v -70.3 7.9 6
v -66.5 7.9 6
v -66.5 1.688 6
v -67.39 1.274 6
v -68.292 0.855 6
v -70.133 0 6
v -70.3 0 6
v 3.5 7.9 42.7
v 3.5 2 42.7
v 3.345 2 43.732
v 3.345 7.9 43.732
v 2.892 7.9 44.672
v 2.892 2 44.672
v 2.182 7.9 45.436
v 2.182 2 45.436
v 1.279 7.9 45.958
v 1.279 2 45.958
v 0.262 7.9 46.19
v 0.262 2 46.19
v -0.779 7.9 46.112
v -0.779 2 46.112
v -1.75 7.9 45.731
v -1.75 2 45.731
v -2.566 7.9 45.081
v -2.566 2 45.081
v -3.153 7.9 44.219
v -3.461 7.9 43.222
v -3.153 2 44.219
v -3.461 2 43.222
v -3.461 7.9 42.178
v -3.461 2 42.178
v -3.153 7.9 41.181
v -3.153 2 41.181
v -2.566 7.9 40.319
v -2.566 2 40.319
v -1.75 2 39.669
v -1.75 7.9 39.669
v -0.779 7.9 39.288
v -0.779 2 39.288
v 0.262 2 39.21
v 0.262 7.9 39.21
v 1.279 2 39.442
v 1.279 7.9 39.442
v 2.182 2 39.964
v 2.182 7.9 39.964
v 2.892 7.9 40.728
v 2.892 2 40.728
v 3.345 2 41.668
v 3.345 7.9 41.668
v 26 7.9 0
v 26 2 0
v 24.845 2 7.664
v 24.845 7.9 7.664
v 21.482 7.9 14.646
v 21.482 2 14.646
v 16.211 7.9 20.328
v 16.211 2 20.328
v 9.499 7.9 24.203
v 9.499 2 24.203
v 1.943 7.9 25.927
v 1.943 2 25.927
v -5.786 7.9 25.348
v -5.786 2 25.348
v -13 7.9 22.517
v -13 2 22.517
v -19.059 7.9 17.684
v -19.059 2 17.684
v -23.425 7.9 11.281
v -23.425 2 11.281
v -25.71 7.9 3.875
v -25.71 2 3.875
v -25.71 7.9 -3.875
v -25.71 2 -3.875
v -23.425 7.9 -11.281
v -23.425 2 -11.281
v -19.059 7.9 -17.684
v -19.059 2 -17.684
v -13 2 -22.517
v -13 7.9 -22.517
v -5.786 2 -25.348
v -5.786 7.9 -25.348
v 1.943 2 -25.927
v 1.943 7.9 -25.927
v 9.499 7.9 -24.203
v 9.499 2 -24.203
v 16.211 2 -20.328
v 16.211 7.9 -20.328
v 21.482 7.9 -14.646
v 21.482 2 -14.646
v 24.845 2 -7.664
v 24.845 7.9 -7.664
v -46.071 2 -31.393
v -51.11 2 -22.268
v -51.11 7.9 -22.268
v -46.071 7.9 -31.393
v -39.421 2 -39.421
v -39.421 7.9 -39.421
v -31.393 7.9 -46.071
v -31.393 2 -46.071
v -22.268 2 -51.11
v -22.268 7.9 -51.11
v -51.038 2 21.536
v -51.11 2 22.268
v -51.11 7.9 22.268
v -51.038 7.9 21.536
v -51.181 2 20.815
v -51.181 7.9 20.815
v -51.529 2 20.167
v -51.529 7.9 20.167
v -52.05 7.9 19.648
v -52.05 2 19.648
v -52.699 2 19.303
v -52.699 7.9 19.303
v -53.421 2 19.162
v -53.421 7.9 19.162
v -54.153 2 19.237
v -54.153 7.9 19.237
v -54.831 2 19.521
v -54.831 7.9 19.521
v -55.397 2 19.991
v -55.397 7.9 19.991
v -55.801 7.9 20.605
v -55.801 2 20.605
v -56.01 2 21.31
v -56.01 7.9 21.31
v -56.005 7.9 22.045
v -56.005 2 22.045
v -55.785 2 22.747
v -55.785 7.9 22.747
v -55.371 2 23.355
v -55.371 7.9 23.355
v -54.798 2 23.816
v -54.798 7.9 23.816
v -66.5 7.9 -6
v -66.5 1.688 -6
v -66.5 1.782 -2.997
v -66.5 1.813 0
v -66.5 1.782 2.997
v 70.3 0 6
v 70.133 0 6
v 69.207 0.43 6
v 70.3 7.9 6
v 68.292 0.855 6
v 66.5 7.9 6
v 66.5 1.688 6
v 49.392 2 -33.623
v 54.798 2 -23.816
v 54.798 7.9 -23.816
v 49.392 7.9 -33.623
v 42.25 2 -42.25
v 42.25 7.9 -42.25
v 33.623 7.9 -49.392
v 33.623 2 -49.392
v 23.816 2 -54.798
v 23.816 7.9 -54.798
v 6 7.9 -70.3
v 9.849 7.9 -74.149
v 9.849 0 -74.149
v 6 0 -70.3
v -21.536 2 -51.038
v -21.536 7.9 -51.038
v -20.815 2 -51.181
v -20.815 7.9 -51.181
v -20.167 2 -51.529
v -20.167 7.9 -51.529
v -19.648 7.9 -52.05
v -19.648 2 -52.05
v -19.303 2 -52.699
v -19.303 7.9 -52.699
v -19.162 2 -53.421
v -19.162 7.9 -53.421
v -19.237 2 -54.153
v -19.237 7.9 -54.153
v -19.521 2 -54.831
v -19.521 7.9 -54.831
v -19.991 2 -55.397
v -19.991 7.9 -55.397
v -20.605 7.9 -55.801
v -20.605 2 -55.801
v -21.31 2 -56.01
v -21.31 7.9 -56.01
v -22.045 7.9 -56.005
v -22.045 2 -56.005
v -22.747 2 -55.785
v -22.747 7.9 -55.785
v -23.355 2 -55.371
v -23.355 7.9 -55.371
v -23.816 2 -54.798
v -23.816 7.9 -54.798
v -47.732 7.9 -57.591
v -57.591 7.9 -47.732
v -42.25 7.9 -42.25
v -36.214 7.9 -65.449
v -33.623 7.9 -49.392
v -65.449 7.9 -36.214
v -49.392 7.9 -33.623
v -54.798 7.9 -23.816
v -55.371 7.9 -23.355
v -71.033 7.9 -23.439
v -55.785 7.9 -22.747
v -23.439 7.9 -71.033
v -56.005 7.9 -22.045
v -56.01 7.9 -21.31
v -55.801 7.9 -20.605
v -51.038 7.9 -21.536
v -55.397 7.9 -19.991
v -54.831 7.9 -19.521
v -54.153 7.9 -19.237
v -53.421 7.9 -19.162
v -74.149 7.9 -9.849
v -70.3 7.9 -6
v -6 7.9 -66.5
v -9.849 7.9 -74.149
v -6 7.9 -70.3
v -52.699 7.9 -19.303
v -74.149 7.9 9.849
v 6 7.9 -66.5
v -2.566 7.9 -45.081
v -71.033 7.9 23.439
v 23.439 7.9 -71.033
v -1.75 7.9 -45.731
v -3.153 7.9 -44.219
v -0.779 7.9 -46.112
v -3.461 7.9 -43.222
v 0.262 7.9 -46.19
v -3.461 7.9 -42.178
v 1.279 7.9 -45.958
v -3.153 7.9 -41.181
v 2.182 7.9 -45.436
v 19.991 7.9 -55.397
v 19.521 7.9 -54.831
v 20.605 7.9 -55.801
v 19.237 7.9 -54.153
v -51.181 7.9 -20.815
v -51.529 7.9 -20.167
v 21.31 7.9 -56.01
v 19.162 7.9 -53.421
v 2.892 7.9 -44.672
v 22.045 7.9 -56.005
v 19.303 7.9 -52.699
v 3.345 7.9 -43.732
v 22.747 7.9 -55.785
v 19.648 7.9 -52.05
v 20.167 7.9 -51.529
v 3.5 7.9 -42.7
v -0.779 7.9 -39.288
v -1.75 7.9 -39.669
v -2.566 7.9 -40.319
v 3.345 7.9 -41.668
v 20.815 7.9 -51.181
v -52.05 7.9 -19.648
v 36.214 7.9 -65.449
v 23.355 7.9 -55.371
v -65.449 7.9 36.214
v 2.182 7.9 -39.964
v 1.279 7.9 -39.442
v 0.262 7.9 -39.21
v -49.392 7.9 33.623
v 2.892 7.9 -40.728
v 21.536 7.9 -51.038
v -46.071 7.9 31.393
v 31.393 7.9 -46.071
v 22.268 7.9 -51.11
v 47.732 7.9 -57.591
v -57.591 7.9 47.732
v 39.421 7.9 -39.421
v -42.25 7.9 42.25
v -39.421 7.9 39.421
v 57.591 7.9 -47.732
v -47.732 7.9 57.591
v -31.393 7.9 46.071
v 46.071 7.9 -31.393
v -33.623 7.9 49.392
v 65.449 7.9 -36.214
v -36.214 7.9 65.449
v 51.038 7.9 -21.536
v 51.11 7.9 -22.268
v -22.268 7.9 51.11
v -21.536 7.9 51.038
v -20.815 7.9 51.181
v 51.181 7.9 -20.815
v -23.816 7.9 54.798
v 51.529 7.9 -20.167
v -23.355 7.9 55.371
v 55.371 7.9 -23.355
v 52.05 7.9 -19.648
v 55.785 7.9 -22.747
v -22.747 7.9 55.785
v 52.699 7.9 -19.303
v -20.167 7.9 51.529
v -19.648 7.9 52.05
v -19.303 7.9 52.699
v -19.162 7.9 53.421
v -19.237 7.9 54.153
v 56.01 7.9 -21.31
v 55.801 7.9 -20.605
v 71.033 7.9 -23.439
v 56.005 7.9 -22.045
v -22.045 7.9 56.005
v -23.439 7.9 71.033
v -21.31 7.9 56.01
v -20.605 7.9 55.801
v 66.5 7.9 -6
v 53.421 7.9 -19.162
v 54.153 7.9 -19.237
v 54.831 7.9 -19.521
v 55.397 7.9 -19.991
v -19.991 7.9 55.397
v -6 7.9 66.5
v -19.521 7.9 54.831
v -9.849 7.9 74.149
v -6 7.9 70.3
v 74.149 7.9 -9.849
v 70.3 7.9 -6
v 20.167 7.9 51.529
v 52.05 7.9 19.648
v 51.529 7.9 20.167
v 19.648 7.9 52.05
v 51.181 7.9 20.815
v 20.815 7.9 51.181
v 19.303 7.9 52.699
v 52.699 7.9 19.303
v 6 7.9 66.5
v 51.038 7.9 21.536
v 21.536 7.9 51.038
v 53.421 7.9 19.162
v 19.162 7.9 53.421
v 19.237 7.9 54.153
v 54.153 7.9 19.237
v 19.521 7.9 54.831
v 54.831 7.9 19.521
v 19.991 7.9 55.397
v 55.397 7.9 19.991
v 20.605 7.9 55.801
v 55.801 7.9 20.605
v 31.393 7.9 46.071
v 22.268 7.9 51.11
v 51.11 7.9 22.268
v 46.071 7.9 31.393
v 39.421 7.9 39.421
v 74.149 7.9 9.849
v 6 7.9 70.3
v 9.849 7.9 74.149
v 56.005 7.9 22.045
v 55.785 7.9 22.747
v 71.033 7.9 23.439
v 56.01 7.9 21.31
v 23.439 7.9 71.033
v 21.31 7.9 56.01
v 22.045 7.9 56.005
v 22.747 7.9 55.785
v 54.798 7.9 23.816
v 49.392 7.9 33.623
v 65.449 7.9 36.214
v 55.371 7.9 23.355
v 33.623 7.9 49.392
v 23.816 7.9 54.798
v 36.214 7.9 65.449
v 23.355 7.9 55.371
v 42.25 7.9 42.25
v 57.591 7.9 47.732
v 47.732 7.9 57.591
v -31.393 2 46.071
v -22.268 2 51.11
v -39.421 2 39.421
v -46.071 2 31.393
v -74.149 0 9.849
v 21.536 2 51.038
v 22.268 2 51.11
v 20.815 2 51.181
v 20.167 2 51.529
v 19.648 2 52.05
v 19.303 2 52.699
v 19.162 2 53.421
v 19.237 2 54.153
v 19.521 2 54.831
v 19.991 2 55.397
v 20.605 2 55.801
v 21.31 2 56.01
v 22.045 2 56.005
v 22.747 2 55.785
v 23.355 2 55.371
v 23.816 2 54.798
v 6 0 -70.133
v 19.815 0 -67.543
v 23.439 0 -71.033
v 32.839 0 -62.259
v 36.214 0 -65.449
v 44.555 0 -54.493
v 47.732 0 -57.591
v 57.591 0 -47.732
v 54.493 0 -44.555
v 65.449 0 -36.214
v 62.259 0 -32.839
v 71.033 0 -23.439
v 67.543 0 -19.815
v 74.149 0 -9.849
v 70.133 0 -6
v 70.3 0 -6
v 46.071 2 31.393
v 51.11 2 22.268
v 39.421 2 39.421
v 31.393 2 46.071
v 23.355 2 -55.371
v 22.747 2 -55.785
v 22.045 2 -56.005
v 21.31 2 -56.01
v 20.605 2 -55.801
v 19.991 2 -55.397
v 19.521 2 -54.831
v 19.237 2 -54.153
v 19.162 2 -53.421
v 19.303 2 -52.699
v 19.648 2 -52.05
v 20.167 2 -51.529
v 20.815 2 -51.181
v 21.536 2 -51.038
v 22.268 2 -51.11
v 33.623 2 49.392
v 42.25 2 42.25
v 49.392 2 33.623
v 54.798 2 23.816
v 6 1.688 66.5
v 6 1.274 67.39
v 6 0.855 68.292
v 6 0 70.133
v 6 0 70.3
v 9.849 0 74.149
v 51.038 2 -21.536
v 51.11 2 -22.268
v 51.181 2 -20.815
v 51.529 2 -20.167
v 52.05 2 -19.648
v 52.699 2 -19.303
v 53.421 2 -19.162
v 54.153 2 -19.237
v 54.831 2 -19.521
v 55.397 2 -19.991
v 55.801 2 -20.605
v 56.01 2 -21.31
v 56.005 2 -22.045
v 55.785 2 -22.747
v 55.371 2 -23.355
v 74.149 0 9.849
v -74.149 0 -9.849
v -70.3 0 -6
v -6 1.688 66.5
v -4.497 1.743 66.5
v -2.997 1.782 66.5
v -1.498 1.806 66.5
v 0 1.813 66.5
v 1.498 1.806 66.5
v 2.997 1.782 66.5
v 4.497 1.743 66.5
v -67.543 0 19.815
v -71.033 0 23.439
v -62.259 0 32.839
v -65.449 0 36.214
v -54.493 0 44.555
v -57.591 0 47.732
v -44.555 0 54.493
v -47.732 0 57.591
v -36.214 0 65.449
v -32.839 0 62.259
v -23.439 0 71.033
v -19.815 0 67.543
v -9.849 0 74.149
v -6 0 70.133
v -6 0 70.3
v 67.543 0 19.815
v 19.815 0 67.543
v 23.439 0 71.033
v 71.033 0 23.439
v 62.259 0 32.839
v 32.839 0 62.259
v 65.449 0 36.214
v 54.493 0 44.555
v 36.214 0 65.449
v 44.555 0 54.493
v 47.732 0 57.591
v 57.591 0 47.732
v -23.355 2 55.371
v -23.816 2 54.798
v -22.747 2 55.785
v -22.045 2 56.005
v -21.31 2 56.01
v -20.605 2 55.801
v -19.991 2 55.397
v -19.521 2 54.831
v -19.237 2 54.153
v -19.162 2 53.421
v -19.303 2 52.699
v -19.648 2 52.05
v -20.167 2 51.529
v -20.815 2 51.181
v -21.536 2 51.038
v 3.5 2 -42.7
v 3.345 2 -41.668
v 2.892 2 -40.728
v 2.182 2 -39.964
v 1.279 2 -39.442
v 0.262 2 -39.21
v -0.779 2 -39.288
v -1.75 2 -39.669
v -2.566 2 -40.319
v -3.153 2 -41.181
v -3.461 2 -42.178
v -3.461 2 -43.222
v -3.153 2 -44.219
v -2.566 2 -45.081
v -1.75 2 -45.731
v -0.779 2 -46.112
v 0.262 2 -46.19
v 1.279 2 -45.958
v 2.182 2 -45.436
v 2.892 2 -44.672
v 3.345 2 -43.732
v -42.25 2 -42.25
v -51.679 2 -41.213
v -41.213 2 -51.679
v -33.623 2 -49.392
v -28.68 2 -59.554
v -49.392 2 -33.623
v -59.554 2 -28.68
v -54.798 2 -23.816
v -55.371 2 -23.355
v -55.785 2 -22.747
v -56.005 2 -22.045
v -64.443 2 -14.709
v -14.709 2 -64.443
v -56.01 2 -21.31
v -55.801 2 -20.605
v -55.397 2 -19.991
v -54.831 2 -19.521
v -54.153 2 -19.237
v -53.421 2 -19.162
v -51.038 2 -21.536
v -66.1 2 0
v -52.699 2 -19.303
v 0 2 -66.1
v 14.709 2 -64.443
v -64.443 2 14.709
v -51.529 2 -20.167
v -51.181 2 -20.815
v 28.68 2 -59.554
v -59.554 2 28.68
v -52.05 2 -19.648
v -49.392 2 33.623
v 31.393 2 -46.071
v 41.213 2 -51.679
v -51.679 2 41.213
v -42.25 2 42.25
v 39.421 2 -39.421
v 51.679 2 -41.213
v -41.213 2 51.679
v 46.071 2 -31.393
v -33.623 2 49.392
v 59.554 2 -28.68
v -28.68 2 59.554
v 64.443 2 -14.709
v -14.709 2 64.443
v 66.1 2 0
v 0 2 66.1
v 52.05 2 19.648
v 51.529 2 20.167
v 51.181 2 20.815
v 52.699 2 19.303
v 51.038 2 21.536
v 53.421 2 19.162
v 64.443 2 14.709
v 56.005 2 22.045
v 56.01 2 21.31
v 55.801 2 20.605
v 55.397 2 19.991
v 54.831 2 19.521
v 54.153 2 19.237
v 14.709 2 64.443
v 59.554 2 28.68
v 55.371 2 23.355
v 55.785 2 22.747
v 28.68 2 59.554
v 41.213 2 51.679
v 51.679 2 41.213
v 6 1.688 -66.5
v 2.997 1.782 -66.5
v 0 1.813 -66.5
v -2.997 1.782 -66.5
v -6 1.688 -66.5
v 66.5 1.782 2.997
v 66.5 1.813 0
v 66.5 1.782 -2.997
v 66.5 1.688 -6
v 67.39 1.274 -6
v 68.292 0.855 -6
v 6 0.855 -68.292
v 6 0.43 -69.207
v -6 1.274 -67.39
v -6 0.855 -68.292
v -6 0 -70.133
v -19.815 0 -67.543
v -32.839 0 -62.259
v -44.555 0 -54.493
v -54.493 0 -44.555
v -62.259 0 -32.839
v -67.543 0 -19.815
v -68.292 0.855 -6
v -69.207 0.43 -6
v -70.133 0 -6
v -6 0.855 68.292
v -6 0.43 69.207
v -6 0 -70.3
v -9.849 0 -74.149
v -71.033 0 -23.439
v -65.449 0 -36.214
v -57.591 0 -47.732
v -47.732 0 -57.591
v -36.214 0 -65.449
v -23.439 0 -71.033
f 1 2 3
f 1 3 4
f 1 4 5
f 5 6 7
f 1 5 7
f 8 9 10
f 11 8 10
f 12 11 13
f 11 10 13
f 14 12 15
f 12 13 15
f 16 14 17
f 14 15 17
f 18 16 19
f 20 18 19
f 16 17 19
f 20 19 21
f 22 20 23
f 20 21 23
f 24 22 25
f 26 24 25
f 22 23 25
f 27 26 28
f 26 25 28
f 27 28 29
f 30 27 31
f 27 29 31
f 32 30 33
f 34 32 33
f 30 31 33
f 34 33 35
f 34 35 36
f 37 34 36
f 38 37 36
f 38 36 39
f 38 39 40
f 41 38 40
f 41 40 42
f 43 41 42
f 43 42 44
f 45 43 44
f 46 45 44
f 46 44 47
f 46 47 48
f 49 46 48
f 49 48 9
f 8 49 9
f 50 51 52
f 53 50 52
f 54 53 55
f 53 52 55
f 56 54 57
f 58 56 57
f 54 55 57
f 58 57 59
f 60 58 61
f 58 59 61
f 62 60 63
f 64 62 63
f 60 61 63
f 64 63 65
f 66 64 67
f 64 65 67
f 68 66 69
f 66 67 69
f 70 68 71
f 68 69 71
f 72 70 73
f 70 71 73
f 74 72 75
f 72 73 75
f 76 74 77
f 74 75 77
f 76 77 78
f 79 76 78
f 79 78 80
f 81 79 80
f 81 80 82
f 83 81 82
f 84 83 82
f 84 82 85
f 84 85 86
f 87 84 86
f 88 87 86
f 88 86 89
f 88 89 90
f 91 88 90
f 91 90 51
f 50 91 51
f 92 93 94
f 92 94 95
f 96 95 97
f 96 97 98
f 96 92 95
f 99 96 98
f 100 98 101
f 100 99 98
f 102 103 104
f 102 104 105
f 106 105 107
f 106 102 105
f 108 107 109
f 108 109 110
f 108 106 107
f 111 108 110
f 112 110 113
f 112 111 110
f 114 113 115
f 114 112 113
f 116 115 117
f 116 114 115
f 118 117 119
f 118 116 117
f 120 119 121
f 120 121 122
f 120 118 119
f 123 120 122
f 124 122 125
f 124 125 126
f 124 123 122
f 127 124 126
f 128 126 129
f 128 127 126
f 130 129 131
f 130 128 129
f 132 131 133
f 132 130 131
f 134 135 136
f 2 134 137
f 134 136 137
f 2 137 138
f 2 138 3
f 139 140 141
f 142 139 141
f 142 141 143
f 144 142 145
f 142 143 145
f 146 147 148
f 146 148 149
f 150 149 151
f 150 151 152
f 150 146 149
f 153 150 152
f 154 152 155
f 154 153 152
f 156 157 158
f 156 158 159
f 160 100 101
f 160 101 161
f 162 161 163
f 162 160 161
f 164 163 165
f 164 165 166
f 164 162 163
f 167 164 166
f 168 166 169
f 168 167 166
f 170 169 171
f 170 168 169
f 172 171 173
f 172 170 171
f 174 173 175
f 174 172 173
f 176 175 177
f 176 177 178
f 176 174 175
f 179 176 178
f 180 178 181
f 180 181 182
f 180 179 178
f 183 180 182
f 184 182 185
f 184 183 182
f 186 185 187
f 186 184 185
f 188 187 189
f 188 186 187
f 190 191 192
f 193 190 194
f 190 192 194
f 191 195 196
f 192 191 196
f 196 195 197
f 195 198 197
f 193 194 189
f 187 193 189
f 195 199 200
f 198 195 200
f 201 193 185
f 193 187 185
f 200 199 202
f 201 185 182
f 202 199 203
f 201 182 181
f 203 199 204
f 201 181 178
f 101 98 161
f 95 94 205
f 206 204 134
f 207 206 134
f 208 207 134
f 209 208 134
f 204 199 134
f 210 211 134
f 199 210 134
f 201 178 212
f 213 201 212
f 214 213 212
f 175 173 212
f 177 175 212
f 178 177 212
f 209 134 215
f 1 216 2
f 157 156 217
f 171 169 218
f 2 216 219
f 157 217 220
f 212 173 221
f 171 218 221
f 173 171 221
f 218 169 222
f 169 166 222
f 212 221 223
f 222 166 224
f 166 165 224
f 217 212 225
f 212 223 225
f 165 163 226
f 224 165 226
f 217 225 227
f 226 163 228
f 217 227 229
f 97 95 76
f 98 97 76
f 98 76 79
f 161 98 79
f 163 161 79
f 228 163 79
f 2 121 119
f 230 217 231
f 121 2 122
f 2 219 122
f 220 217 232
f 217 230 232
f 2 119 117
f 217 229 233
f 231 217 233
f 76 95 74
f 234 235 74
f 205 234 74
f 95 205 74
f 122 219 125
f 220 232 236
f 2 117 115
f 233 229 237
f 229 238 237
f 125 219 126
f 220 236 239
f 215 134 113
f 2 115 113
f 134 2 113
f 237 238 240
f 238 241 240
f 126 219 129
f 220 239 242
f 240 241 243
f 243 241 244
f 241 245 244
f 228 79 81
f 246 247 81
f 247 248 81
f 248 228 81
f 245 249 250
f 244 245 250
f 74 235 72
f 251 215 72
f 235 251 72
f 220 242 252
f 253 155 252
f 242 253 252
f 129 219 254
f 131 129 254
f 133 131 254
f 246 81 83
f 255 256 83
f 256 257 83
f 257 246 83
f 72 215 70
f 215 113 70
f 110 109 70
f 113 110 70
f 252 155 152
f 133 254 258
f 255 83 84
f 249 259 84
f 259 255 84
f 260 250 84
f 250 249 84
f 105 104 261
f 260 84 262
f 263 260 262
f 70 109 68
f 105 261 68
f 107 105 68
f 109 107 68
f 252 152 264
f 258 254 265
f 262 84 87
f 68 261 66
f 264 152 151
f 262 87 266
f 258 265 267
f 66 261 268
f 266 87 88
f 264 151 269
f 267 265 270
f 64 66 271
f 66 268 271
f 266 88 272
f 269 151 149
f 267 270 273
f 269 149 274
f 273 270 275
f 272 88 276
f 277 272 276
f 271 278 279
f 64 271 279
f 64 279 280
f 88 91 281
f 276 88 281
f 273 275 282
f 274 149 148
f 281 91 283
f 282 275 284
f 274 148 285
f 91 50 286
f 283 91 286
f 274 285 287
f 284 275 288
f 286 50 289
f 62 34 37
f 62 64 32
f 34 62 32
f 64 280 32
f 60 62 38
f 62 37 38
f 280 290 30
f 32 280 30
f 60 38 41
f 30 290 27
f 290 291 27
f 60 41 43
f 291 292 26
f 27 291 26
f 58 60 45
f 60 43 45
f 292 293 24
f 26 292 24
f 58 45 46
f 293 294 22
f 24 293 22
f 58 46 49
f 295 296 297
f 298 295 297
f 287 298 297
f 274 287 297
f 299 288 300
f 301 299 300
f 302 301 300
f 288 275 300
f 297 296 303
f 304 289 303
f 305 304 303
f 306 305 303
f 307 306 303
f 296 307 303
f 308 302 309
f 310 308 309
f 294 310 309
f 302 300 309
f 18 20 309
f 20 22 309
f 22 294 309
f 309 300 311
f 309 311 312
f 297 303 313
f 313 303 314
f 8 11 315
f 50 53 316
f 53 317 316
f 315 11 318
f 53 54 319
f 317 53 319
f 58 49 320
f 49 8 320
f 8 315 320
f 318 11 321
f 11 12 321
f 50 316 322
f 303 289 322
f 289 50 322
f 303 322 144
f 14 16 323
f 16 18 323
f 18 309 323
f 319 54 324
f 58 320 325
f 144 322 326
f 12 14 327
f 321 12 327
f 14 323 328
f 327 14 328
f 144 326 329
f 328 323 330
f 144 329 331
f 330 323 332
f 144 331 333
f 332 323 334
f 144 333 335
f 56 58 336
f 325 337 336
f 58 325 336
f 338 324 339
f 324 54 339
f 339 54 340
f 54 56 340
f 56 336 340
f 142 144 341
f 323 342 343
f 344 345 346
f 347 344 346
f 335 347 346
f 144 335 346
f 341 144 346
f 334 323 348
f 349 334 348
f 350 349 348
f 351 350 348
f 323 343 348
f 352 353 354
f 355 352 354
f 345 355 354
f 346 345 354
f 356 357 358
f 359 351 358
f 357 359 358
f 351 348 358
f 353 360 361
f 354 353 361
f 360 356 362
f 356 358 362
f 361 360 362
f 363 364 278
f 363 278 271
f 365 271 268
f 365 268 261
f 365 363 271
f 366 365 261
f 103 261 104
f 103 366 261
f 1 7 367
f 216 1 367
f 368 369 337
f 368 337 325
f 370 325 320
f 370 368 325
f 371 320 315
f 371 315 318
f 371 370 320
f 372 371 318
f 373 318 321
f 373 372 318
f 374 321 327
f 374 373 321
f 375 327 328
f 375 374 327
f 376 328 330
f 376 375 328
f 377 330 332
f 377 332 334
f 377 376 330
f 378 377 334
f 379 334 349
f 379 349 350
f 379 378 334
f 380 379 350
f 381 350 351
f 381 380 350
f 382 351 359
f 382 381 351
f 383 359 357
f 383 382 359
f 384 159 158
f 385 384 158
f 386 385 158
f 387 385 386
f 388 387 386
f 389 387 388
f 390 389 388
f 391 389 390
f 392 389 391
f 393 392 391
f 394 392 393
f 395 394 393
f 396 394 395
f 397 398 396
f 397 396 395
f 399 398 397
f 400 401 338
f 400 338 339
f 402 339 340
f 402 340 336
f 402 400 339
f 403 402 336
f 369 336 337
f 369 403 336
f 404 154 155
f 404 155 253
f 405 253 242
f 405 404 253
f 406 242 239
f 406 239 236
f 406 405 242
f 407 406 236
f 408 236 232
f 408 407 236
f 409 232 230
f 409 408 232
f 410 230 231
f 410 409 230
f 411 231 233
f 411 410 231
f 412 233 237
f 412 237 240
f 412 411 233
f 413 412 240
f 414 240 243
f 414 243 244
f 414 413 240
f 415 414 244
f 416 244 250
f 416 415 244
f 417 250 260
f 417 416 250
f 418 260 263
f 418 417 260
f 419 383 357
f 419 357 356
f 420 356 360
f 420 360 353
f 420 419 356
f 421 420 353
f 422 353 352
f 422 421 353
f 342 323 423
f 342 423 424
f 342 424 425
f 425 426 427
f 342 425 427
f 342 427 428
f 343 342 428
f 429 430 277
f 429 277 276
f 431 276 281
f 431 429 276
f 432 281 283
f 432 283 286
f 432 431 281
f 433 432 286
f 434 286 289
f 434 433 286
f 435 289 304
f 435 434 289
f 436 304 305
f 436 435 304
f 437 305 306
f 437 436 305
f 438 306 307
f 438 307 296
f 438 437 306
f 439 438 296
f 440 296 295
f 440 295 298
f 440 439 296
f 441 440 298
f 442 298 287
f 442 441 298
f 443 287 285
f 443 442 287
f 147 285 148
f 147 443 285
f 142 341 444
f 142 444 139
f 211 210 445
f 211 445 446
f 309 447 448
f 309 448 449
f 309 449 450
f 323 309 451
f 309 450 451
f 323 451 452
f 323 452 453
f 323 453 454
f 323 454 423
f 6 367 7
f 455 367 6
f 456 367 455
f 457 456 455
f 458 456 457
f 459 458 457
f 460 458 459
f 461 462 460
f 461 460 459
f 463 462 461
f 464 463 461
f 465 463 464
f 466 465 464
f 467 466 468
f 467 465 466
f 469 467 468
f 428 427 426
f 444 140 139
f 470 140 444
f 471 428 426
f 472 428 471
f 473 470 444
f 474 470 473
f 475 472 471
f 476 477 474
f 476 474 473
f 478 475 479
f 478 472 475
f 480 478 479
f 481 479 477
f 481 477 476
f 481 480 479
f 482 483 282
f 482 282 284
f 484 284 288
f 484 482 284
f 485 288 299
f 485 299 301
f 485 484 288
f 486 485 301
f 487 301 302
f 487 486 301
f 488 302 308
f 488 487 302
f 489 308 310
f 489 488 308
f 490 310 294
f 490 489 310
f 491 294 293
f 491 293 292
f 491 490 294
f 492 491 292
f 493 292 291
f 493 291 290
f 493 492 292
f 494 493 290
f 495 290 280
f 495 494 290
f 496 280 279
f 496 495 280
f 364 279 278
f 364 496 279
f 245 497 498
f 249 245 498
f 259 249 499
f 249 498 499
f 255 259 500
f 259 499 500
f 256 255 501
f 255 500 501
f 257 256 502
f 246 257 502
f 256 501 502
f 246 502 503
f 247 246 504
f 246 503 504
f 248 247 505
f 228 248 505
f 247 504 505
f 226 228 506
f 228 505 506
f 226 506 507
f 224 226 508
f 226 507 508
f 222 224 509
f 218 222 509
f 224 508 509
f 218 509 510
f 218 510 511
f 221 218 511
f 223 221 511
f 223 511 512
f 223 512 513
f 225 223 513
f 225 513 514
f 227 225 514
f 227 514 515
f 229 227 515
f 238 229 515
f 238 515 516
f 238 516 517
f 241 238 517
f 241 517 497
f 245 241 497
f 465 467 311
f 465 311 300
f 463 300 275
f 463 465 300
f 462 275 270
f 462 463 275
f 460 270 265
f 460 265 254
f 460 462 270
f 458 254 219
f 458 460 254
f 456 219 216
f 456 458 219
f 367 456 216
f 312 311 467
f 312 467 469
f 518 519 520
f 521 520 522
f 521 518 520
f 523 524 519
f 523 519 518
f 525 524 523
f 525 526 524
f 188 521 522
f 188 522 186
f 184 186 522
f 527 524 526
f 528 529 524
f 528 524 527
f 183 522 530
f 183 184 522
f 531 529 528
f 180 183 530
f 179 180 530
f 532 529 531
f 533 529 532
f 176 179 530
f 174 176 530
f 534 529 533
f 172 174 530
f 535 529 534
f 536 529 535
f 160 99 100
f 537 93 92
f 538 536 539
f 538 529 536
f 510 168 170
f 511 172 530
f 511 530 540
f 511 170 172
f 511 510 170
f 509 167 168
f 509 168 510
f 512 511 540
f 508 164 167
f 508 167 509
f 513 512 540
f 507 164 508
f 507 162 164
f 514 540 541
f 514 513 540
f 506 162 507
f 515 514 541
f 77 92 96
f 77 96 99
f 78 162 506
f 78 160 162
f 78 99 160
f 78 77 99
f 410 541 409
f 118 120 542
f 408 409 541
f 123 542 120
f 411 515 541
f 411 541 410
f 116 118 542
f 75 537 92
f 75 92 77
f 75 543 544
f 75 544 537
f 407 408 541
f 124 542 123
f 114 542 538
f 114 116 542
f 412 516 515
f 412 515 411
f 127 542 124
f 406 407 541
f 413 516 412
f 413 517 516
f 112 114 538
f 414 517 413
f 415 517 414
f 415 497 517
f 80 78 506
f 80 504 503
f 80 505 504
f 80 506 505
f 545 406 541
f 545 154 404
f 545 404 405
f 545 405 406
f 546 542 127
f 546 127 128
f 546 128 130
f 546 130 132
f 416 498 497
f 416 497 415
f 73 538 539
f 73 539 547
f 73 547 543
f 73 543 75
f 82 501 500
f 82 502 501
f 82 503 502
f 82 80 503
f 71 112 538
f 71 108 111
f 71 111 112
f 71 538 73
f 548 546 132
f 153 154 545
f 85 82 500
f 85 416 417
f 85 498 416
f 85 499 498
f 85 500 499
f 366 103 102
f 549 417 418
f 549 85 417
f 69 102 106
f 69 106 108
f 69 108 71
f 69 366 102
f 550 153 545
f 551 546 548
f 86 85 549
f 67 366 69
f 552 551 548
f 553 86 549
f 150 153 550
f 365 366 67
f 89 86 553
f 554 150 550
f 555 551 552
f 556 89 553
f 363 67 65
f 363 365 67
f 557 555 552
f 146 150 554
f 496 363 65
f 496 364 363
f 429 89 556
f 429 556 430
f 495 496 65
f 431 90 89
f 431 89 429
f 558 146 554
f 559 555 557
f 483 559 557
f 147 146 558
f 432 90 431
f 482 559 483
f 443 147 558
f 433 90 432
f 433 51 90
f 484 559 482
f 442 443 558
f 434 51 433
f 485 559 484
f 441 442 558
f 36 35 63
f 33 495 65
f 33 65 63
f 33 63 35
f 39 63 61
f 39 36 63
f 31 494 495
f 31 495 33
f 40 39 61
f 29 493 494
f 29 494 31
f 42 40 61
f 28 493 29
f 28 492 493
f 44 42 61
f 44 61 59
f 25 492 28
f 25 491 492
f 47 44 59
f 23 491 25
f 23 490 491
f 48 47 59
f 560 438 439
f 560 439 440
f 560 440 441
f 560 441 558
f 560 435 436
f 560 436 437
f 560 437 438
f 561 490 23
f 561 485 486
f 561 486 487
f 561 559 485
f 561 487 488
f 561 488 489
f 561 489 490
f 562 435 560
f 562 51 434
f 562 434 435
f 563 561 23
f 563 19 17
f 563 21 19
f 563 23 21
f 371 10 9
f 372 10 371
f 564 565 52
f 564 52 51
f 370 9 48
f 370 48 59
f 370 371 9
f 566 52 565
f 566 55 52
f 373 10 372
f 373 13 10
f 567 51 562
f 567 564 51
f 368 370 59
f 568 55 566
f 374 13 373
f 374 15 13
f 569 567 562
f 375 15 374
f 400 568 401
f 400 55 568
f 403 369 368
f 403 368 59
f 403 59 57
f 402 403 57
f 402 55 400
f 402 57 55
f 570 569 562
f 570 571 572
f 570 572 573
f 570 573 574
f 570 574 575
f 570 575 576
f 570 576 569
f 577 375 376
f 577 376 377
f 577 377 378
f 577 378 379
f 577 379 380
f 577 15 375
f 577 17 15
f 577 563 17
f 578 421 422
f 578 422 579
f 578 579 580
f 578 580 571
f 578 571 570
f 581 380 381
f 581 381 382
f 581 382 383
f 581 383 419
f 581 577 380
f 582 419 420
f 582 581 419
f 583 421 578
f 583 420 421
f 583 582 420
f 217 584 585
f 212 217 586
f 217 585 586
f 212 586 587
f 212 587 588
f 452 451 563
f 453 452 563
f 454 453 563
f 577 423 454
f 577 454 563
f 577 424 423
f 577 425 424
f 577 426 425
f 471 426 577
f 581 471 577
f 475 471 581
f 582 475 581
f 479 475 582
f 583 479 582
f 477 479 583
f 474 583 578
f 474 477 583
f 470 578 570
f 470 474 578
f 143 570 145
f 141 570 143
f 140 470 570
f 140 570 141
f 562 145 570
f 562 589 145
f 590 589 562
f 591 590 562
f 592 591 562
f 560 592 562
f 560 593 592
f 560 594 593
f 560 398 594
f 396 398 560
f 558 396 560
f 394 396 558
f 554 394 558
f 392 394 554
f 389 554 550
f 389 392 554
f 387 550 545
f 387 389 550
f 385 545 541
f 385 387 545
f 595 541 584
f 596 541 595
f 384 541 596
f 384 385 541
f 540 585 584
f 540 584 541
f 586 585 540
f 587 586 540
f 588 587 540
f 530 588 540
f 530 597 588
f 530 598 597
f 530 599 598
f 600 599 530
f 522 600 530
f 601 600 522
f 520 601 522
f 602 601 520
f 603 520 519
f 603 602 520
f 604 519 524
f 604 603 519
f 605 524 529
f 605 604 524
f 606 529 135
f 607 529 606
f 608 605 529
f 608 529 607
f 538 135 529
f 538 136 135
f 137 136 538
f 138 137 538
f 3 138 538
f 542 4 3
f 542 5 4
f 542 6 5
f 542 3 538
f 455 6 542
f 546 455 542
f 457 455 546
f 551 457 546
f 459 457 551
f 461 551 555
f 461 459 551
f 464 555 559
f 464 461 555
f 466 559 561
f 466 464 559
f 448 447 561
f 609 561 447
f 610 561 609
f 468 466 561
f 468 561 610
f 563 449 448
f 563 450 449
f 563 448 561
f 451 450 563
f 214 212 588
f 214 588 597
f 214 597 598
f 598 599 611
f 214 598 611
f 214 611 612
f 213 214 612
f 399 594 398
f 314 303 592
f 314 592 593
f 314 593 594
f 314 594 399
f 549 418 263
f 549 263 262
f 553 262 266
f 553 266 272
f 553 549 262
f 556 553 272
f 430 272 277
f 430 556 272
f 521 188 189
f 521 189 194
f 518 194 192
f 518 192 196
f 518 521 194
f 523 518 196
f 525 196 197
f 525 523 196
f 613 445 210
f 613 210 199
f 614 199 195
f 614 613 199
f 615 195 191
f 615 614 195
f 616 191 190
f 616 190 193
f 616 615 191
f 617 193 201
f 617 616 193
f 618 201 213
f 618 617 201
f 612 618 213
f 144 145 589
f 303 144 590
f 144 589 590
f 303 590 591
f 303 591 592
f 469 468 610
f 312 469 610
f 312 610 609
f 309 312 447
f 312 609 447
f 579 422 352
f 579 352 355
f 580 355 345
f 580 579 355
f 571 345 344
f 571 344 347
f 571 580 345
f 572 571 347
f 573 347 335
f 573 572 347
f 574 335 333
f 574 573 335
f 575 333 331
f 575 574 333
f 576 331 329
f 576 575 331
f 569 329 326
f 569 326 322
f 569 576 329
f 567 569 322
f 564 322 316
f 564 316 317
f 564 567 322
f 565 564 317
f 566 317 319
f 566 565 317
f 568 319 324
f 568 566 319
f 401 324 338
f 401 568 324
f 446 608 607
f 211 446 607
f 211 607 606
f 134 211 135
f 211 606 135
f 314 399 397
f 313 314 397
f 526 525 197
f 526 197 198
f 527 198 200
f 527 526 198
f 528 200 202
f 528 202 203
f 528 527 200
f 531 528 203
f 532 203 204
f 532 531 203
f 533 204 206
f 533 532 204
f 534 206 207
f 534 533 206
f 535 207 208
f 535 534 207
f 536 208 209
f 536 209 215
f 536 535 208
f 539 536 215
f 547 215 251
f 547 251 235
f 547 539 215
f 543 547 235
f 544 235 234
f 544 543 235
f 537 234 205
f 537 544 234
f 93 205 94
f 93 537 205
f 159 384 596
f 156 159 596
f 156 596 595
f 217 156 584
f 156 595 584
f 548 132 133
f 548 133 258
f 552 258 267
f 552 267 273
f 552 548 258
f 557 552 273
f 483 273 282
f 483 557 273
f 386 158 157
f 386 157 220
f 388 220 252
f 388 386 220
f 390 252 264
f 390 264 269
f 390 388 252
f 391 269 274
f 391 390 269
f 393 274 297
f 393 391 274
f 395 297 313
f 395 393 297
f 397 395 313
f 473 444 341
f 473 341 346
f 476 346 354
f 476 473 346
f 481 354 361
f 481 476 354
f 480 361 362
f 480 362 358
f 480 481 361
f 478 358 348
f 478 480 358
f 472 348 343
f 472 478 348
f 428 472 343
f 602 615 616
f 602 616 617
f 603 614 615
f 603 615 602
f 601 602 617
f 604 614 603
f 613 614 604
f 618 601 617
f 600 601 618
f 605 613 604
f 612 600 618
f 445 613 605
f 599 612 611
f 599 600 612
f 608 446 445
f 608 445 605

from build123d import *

# Parameters (mm, degrees)
F0_R     = 74.8
F0_R_2   = 3.5
F0_R_3   = 26
F1_DEPTH = 7.9
F2_DEPTH = 7.9
F3_R     = 66.1
F3_R_2   = 3.5
F3_R_3   = 26
F4_DEPTH = 2
F8_DEPTH = 5.9
F9_DEPTH = 2


# Not quite as in the source:
# - a feature names something its author has since deleted; it is built from what else it names


with BuildPart() as f1:
    # F0 (on Front) → F1 (new body)
    with BuildSketch(Plane.XZ):
        Circle(F0_R)
        with BuildLine():
            ThreePointArc((-23.816128087, -54.7983078474), (-42.2496301759, -42.2496301759), (-54.7983078474, -23.816128087))
            ThreePointArc((-54.7983078474, -23.816128087), (-54.50218665, -19.353932752), (-51.1097752784, -22.2677652896))
            ThreePointArc((-51.1097752784, -22.2677652896), (-39.4212030512, -39.4212030512), (-22.2677652896, -51.1097752784))
            ThreePointArc((-22.2677652896, -51.1097752784), (-19.353932752, -54.50218665), (-23.816128087, -54.7983078474))
        make_face(mode=Mode.SUBTRACT)
        with Locations((0, -42.7)):
            Circle(F0_R_2, mode=Mode.SUBTRACT)
        Circle(F0_R_3, mode=Mode.SUBTRACT)
        with BuildLine():
            ThreePointArc((54.7983078474, -23.816128087), (42.2496301759, -42.2496301759), (23.816128087, -54.7983078474))
            ThreePointArc((23.816128087, -54.7983078474), (19.353932752, -54.50218665), (22.2677652896, -51.1097752784))
            ThreePointArc((22.2677652896, -51.1097752784), (39.4212030512, -39.4212030512), (51.1097752784, -22.2677652896))
            ThreePointArc((51.1097752784, -22.2677652896), (54.50218665, -19.353932752), (54.7983078474, -23.816128087))
        make_face(mode=Mode.SUBTRACT)
        with BuildLine():
            ThreePointArc((-54.7983078474, 23.816128087), (-42.2496301759, 42.2496301759), (-23.816128087, 54.7983078474))
            ThreePointArc((-23.816128087, 54.7983078474), (-19.353932752, 54.50218665), (-22.2677652896, 51.1097752784))
            ThreePointArc((-22.2677652896, 51.1097752784), (-39.4212030512, 39.4212030512), (-51.1097752784, 22.2677652896))
            ThreePointArc((-51.1097752784, 22.2677652896), (-54.50218665, 19.353932752), (-54.7983078474, 23.816128087))
        make_face(mode=Mode.SUBTRACT)
        with Locations((0, 42.7)):
            Circle(F0_R_2, mode=Mode.SUBTRACT)
        with BuildLine():
            ThreePointArc((54.7983078474, 23.816128087), (54.50218665, 19.353932752), (51.1097752784, 22.2677652896))
            ThreePointArc((51.1097752784, 22.2677652896), (39.4212030512, 39.4212030512), (22.2677652896, 51.1097752784))
            ThreePointArc((22.2677652896, 51.1097752784), (19.353932752, 54.50218665), (23.816128087, 54.7983078474))
            ThreePointArc((23.816128087, 54.7983078474), (42.2496301759, 42.2496301759), (54.7983078474, 23.816128087))
        make_face(mode=Mode.SUBTRACT)
        Circle(F0_R_3)
    extrude(amount=-F1_DEPTH)

    # F0 (on Front) → F2 (cut)
    with BuildSketch(Plane.XZ):
        Circle(F0_R_3)
    extrude(amount=-F2_DEPTH, mode=Mode.SUBTRACT)

    # F3 (on face) → F4 (cut)
    with BuildSketch(Plane.XZ):
        Circle(F3_R)
        with BuildLine():
            ThreePointArc((-22.2677652896, -51.1097752784), (-19.353932752, -54.50218665), (-23.816128087, -54.7983078474))
            ThreePointArc((-23.816128087, -54.7983078474), (-42.2496301759, -42.2496301759), (-54.7983078474, -23.816128087))
            ThreePointArc((-54.7983078474, -23.816128087), (-54.50218665, -19.353932752), (-51.1097752784, -22.2677652896))
            ThreePointArc((-51.1097752784, -22.2677652896), (-39.4212030512, -39.4212030512), (-22.2677652896, -51.1097752784))
        make_face(mode=Mode.SUBTRACT)
        with Locations((0, -42.7)):
            Circle(F3_R_2, mode=Mode.SUBTRACT)
        Circle(F3_R_3, mode=Mode.SUBTRACT)
        with BuildLine():
            ThreePointArc((51.1097752784, -22.2677652896), (54.50218665, -19.353932752), (54.7983078474, -23.816128087))
            ThreePointArc((54.7983078474, -23.816128087), (42.2496301759, -42.2496301759), (23.816128087, -54.7983078474))
            ThreePointArc((23.816128087, -54.7983078474), (19.353932752, -54.50218665), (22.2677652896, -51.1097752784))
            ThreePointArc((22.2677652896, -51.1097752784), (39.4212030512, -39.4212030512), (51.1097752784, -22.2677652896))
        make_face(mode=Mode.SUBTRACT)
        with BuildLine():
            ThreePointArc((-51.1097752784, 22.2677652896), (-54.50218665, 19.353932752), (-54.7983078474, 23.816128087))
            ThreePointArc((-54.7983078474, 23.816128087), (-42.2496301759, 42.2496301759), (-23.816128087, 54.7983078474))
            ThreePointArc((-23.816128087, 54.7983078474), (-19.353932752, 54.50218665), (-22.2677652896, 51.1097752784))
            ThreePointArc((-22.2677652896, 51.1097752784), (-39.4212030512, 39.4212030512), (-51.1097752784, 22.2677652896))
        make_face(mode=Mode.SUBTRACT)
        with Locations((0, 42.7)):
            Circle(F3_R_2, mode=Mode.SUBTRACT)
        with BuildLine():
            ThreePointArc((23.816128087, 54.7983078474), (42.2496301759, 42.2496301759), (54.7983078474, 23.816128087))
            ThreePointArc((54.7983078474, 23.816128087), (54.50218665, 19.353932752), (51.1097752784, 22.2677652896))
            ThreePointArc((51.1097752784, 22.2677652896), (39.4212030512, 39.4212030512), (22.2677652896, 51.1097752784))
            ThreePointArc((22.2677652896, 51.1097752784), (19.353932752, 54.50218665), (23.816128087, 54.7983078474))
        make_face(mode=Mode.SUBTRACT)
    extrude(amount=-F4_DEPTH, mode=Mode.SUBTRACT)

    # F5 (on Right) → F6 (revolve, cut)
    with BuildSketch(Plane.YZ):
        Polygon((-1.7160152132, 0), (2, 0), (2, 66.1), (-1.7160152132, 74.0690203414), align=None)
    revolve(axis=Axis((0, 0.1419923934, 0), (0, 1, 0)), mode=Mode.SUBTRACT)

    # F7 (on face) → F8 (cut)
    with BuildSketch(Plane.XZ.offset(-2)):
        Polygon((-6, 70.3), (-6, 66.5), (6, 66.5), (6, 70.3), (12.4951375847, 76.7951375847), (-12.3430622144, 76.6430622144), align=None)
        Polygon((-66.5, 6), (-70.3, 6), (-76.7951375847, 12.4951375847), (-76.6430622144, -12.3430622144), (-70.3, -6), (-66.5, -6), align=None)
        Polygon((-6, -66.5), (-6, -70.3), (-12.4951375847, -76.7951375847), (12.3430622144, -76.6430622144), (6, -70.3), (6, -66.5), align=None)
        Polygon((66.5, -6), (70.3, -6), (76.7951375847, -12.4951375847), (76.6430622144, 12.3430622144), (70.3, 6), (66.5, 6), align=None)
    extrude(amount=-F8_DEPTH, mode=Mode.SUBTRACT)

    # F9 (cut): faces of the model
    f9_faces = [f1.faces().sort_by_distance(p)[0] for p in [
        (0, 2, 70.9549233508),
        (0, 2, -70.9549233508),
        (-70.9549233508, 2, 0),
        (70.9549233508, 2, 0),
    ]]
    extrude(f9_faces, amount=-F9_DEPTH, mode=Mode.SUBTRACT)


solid = f1.part
